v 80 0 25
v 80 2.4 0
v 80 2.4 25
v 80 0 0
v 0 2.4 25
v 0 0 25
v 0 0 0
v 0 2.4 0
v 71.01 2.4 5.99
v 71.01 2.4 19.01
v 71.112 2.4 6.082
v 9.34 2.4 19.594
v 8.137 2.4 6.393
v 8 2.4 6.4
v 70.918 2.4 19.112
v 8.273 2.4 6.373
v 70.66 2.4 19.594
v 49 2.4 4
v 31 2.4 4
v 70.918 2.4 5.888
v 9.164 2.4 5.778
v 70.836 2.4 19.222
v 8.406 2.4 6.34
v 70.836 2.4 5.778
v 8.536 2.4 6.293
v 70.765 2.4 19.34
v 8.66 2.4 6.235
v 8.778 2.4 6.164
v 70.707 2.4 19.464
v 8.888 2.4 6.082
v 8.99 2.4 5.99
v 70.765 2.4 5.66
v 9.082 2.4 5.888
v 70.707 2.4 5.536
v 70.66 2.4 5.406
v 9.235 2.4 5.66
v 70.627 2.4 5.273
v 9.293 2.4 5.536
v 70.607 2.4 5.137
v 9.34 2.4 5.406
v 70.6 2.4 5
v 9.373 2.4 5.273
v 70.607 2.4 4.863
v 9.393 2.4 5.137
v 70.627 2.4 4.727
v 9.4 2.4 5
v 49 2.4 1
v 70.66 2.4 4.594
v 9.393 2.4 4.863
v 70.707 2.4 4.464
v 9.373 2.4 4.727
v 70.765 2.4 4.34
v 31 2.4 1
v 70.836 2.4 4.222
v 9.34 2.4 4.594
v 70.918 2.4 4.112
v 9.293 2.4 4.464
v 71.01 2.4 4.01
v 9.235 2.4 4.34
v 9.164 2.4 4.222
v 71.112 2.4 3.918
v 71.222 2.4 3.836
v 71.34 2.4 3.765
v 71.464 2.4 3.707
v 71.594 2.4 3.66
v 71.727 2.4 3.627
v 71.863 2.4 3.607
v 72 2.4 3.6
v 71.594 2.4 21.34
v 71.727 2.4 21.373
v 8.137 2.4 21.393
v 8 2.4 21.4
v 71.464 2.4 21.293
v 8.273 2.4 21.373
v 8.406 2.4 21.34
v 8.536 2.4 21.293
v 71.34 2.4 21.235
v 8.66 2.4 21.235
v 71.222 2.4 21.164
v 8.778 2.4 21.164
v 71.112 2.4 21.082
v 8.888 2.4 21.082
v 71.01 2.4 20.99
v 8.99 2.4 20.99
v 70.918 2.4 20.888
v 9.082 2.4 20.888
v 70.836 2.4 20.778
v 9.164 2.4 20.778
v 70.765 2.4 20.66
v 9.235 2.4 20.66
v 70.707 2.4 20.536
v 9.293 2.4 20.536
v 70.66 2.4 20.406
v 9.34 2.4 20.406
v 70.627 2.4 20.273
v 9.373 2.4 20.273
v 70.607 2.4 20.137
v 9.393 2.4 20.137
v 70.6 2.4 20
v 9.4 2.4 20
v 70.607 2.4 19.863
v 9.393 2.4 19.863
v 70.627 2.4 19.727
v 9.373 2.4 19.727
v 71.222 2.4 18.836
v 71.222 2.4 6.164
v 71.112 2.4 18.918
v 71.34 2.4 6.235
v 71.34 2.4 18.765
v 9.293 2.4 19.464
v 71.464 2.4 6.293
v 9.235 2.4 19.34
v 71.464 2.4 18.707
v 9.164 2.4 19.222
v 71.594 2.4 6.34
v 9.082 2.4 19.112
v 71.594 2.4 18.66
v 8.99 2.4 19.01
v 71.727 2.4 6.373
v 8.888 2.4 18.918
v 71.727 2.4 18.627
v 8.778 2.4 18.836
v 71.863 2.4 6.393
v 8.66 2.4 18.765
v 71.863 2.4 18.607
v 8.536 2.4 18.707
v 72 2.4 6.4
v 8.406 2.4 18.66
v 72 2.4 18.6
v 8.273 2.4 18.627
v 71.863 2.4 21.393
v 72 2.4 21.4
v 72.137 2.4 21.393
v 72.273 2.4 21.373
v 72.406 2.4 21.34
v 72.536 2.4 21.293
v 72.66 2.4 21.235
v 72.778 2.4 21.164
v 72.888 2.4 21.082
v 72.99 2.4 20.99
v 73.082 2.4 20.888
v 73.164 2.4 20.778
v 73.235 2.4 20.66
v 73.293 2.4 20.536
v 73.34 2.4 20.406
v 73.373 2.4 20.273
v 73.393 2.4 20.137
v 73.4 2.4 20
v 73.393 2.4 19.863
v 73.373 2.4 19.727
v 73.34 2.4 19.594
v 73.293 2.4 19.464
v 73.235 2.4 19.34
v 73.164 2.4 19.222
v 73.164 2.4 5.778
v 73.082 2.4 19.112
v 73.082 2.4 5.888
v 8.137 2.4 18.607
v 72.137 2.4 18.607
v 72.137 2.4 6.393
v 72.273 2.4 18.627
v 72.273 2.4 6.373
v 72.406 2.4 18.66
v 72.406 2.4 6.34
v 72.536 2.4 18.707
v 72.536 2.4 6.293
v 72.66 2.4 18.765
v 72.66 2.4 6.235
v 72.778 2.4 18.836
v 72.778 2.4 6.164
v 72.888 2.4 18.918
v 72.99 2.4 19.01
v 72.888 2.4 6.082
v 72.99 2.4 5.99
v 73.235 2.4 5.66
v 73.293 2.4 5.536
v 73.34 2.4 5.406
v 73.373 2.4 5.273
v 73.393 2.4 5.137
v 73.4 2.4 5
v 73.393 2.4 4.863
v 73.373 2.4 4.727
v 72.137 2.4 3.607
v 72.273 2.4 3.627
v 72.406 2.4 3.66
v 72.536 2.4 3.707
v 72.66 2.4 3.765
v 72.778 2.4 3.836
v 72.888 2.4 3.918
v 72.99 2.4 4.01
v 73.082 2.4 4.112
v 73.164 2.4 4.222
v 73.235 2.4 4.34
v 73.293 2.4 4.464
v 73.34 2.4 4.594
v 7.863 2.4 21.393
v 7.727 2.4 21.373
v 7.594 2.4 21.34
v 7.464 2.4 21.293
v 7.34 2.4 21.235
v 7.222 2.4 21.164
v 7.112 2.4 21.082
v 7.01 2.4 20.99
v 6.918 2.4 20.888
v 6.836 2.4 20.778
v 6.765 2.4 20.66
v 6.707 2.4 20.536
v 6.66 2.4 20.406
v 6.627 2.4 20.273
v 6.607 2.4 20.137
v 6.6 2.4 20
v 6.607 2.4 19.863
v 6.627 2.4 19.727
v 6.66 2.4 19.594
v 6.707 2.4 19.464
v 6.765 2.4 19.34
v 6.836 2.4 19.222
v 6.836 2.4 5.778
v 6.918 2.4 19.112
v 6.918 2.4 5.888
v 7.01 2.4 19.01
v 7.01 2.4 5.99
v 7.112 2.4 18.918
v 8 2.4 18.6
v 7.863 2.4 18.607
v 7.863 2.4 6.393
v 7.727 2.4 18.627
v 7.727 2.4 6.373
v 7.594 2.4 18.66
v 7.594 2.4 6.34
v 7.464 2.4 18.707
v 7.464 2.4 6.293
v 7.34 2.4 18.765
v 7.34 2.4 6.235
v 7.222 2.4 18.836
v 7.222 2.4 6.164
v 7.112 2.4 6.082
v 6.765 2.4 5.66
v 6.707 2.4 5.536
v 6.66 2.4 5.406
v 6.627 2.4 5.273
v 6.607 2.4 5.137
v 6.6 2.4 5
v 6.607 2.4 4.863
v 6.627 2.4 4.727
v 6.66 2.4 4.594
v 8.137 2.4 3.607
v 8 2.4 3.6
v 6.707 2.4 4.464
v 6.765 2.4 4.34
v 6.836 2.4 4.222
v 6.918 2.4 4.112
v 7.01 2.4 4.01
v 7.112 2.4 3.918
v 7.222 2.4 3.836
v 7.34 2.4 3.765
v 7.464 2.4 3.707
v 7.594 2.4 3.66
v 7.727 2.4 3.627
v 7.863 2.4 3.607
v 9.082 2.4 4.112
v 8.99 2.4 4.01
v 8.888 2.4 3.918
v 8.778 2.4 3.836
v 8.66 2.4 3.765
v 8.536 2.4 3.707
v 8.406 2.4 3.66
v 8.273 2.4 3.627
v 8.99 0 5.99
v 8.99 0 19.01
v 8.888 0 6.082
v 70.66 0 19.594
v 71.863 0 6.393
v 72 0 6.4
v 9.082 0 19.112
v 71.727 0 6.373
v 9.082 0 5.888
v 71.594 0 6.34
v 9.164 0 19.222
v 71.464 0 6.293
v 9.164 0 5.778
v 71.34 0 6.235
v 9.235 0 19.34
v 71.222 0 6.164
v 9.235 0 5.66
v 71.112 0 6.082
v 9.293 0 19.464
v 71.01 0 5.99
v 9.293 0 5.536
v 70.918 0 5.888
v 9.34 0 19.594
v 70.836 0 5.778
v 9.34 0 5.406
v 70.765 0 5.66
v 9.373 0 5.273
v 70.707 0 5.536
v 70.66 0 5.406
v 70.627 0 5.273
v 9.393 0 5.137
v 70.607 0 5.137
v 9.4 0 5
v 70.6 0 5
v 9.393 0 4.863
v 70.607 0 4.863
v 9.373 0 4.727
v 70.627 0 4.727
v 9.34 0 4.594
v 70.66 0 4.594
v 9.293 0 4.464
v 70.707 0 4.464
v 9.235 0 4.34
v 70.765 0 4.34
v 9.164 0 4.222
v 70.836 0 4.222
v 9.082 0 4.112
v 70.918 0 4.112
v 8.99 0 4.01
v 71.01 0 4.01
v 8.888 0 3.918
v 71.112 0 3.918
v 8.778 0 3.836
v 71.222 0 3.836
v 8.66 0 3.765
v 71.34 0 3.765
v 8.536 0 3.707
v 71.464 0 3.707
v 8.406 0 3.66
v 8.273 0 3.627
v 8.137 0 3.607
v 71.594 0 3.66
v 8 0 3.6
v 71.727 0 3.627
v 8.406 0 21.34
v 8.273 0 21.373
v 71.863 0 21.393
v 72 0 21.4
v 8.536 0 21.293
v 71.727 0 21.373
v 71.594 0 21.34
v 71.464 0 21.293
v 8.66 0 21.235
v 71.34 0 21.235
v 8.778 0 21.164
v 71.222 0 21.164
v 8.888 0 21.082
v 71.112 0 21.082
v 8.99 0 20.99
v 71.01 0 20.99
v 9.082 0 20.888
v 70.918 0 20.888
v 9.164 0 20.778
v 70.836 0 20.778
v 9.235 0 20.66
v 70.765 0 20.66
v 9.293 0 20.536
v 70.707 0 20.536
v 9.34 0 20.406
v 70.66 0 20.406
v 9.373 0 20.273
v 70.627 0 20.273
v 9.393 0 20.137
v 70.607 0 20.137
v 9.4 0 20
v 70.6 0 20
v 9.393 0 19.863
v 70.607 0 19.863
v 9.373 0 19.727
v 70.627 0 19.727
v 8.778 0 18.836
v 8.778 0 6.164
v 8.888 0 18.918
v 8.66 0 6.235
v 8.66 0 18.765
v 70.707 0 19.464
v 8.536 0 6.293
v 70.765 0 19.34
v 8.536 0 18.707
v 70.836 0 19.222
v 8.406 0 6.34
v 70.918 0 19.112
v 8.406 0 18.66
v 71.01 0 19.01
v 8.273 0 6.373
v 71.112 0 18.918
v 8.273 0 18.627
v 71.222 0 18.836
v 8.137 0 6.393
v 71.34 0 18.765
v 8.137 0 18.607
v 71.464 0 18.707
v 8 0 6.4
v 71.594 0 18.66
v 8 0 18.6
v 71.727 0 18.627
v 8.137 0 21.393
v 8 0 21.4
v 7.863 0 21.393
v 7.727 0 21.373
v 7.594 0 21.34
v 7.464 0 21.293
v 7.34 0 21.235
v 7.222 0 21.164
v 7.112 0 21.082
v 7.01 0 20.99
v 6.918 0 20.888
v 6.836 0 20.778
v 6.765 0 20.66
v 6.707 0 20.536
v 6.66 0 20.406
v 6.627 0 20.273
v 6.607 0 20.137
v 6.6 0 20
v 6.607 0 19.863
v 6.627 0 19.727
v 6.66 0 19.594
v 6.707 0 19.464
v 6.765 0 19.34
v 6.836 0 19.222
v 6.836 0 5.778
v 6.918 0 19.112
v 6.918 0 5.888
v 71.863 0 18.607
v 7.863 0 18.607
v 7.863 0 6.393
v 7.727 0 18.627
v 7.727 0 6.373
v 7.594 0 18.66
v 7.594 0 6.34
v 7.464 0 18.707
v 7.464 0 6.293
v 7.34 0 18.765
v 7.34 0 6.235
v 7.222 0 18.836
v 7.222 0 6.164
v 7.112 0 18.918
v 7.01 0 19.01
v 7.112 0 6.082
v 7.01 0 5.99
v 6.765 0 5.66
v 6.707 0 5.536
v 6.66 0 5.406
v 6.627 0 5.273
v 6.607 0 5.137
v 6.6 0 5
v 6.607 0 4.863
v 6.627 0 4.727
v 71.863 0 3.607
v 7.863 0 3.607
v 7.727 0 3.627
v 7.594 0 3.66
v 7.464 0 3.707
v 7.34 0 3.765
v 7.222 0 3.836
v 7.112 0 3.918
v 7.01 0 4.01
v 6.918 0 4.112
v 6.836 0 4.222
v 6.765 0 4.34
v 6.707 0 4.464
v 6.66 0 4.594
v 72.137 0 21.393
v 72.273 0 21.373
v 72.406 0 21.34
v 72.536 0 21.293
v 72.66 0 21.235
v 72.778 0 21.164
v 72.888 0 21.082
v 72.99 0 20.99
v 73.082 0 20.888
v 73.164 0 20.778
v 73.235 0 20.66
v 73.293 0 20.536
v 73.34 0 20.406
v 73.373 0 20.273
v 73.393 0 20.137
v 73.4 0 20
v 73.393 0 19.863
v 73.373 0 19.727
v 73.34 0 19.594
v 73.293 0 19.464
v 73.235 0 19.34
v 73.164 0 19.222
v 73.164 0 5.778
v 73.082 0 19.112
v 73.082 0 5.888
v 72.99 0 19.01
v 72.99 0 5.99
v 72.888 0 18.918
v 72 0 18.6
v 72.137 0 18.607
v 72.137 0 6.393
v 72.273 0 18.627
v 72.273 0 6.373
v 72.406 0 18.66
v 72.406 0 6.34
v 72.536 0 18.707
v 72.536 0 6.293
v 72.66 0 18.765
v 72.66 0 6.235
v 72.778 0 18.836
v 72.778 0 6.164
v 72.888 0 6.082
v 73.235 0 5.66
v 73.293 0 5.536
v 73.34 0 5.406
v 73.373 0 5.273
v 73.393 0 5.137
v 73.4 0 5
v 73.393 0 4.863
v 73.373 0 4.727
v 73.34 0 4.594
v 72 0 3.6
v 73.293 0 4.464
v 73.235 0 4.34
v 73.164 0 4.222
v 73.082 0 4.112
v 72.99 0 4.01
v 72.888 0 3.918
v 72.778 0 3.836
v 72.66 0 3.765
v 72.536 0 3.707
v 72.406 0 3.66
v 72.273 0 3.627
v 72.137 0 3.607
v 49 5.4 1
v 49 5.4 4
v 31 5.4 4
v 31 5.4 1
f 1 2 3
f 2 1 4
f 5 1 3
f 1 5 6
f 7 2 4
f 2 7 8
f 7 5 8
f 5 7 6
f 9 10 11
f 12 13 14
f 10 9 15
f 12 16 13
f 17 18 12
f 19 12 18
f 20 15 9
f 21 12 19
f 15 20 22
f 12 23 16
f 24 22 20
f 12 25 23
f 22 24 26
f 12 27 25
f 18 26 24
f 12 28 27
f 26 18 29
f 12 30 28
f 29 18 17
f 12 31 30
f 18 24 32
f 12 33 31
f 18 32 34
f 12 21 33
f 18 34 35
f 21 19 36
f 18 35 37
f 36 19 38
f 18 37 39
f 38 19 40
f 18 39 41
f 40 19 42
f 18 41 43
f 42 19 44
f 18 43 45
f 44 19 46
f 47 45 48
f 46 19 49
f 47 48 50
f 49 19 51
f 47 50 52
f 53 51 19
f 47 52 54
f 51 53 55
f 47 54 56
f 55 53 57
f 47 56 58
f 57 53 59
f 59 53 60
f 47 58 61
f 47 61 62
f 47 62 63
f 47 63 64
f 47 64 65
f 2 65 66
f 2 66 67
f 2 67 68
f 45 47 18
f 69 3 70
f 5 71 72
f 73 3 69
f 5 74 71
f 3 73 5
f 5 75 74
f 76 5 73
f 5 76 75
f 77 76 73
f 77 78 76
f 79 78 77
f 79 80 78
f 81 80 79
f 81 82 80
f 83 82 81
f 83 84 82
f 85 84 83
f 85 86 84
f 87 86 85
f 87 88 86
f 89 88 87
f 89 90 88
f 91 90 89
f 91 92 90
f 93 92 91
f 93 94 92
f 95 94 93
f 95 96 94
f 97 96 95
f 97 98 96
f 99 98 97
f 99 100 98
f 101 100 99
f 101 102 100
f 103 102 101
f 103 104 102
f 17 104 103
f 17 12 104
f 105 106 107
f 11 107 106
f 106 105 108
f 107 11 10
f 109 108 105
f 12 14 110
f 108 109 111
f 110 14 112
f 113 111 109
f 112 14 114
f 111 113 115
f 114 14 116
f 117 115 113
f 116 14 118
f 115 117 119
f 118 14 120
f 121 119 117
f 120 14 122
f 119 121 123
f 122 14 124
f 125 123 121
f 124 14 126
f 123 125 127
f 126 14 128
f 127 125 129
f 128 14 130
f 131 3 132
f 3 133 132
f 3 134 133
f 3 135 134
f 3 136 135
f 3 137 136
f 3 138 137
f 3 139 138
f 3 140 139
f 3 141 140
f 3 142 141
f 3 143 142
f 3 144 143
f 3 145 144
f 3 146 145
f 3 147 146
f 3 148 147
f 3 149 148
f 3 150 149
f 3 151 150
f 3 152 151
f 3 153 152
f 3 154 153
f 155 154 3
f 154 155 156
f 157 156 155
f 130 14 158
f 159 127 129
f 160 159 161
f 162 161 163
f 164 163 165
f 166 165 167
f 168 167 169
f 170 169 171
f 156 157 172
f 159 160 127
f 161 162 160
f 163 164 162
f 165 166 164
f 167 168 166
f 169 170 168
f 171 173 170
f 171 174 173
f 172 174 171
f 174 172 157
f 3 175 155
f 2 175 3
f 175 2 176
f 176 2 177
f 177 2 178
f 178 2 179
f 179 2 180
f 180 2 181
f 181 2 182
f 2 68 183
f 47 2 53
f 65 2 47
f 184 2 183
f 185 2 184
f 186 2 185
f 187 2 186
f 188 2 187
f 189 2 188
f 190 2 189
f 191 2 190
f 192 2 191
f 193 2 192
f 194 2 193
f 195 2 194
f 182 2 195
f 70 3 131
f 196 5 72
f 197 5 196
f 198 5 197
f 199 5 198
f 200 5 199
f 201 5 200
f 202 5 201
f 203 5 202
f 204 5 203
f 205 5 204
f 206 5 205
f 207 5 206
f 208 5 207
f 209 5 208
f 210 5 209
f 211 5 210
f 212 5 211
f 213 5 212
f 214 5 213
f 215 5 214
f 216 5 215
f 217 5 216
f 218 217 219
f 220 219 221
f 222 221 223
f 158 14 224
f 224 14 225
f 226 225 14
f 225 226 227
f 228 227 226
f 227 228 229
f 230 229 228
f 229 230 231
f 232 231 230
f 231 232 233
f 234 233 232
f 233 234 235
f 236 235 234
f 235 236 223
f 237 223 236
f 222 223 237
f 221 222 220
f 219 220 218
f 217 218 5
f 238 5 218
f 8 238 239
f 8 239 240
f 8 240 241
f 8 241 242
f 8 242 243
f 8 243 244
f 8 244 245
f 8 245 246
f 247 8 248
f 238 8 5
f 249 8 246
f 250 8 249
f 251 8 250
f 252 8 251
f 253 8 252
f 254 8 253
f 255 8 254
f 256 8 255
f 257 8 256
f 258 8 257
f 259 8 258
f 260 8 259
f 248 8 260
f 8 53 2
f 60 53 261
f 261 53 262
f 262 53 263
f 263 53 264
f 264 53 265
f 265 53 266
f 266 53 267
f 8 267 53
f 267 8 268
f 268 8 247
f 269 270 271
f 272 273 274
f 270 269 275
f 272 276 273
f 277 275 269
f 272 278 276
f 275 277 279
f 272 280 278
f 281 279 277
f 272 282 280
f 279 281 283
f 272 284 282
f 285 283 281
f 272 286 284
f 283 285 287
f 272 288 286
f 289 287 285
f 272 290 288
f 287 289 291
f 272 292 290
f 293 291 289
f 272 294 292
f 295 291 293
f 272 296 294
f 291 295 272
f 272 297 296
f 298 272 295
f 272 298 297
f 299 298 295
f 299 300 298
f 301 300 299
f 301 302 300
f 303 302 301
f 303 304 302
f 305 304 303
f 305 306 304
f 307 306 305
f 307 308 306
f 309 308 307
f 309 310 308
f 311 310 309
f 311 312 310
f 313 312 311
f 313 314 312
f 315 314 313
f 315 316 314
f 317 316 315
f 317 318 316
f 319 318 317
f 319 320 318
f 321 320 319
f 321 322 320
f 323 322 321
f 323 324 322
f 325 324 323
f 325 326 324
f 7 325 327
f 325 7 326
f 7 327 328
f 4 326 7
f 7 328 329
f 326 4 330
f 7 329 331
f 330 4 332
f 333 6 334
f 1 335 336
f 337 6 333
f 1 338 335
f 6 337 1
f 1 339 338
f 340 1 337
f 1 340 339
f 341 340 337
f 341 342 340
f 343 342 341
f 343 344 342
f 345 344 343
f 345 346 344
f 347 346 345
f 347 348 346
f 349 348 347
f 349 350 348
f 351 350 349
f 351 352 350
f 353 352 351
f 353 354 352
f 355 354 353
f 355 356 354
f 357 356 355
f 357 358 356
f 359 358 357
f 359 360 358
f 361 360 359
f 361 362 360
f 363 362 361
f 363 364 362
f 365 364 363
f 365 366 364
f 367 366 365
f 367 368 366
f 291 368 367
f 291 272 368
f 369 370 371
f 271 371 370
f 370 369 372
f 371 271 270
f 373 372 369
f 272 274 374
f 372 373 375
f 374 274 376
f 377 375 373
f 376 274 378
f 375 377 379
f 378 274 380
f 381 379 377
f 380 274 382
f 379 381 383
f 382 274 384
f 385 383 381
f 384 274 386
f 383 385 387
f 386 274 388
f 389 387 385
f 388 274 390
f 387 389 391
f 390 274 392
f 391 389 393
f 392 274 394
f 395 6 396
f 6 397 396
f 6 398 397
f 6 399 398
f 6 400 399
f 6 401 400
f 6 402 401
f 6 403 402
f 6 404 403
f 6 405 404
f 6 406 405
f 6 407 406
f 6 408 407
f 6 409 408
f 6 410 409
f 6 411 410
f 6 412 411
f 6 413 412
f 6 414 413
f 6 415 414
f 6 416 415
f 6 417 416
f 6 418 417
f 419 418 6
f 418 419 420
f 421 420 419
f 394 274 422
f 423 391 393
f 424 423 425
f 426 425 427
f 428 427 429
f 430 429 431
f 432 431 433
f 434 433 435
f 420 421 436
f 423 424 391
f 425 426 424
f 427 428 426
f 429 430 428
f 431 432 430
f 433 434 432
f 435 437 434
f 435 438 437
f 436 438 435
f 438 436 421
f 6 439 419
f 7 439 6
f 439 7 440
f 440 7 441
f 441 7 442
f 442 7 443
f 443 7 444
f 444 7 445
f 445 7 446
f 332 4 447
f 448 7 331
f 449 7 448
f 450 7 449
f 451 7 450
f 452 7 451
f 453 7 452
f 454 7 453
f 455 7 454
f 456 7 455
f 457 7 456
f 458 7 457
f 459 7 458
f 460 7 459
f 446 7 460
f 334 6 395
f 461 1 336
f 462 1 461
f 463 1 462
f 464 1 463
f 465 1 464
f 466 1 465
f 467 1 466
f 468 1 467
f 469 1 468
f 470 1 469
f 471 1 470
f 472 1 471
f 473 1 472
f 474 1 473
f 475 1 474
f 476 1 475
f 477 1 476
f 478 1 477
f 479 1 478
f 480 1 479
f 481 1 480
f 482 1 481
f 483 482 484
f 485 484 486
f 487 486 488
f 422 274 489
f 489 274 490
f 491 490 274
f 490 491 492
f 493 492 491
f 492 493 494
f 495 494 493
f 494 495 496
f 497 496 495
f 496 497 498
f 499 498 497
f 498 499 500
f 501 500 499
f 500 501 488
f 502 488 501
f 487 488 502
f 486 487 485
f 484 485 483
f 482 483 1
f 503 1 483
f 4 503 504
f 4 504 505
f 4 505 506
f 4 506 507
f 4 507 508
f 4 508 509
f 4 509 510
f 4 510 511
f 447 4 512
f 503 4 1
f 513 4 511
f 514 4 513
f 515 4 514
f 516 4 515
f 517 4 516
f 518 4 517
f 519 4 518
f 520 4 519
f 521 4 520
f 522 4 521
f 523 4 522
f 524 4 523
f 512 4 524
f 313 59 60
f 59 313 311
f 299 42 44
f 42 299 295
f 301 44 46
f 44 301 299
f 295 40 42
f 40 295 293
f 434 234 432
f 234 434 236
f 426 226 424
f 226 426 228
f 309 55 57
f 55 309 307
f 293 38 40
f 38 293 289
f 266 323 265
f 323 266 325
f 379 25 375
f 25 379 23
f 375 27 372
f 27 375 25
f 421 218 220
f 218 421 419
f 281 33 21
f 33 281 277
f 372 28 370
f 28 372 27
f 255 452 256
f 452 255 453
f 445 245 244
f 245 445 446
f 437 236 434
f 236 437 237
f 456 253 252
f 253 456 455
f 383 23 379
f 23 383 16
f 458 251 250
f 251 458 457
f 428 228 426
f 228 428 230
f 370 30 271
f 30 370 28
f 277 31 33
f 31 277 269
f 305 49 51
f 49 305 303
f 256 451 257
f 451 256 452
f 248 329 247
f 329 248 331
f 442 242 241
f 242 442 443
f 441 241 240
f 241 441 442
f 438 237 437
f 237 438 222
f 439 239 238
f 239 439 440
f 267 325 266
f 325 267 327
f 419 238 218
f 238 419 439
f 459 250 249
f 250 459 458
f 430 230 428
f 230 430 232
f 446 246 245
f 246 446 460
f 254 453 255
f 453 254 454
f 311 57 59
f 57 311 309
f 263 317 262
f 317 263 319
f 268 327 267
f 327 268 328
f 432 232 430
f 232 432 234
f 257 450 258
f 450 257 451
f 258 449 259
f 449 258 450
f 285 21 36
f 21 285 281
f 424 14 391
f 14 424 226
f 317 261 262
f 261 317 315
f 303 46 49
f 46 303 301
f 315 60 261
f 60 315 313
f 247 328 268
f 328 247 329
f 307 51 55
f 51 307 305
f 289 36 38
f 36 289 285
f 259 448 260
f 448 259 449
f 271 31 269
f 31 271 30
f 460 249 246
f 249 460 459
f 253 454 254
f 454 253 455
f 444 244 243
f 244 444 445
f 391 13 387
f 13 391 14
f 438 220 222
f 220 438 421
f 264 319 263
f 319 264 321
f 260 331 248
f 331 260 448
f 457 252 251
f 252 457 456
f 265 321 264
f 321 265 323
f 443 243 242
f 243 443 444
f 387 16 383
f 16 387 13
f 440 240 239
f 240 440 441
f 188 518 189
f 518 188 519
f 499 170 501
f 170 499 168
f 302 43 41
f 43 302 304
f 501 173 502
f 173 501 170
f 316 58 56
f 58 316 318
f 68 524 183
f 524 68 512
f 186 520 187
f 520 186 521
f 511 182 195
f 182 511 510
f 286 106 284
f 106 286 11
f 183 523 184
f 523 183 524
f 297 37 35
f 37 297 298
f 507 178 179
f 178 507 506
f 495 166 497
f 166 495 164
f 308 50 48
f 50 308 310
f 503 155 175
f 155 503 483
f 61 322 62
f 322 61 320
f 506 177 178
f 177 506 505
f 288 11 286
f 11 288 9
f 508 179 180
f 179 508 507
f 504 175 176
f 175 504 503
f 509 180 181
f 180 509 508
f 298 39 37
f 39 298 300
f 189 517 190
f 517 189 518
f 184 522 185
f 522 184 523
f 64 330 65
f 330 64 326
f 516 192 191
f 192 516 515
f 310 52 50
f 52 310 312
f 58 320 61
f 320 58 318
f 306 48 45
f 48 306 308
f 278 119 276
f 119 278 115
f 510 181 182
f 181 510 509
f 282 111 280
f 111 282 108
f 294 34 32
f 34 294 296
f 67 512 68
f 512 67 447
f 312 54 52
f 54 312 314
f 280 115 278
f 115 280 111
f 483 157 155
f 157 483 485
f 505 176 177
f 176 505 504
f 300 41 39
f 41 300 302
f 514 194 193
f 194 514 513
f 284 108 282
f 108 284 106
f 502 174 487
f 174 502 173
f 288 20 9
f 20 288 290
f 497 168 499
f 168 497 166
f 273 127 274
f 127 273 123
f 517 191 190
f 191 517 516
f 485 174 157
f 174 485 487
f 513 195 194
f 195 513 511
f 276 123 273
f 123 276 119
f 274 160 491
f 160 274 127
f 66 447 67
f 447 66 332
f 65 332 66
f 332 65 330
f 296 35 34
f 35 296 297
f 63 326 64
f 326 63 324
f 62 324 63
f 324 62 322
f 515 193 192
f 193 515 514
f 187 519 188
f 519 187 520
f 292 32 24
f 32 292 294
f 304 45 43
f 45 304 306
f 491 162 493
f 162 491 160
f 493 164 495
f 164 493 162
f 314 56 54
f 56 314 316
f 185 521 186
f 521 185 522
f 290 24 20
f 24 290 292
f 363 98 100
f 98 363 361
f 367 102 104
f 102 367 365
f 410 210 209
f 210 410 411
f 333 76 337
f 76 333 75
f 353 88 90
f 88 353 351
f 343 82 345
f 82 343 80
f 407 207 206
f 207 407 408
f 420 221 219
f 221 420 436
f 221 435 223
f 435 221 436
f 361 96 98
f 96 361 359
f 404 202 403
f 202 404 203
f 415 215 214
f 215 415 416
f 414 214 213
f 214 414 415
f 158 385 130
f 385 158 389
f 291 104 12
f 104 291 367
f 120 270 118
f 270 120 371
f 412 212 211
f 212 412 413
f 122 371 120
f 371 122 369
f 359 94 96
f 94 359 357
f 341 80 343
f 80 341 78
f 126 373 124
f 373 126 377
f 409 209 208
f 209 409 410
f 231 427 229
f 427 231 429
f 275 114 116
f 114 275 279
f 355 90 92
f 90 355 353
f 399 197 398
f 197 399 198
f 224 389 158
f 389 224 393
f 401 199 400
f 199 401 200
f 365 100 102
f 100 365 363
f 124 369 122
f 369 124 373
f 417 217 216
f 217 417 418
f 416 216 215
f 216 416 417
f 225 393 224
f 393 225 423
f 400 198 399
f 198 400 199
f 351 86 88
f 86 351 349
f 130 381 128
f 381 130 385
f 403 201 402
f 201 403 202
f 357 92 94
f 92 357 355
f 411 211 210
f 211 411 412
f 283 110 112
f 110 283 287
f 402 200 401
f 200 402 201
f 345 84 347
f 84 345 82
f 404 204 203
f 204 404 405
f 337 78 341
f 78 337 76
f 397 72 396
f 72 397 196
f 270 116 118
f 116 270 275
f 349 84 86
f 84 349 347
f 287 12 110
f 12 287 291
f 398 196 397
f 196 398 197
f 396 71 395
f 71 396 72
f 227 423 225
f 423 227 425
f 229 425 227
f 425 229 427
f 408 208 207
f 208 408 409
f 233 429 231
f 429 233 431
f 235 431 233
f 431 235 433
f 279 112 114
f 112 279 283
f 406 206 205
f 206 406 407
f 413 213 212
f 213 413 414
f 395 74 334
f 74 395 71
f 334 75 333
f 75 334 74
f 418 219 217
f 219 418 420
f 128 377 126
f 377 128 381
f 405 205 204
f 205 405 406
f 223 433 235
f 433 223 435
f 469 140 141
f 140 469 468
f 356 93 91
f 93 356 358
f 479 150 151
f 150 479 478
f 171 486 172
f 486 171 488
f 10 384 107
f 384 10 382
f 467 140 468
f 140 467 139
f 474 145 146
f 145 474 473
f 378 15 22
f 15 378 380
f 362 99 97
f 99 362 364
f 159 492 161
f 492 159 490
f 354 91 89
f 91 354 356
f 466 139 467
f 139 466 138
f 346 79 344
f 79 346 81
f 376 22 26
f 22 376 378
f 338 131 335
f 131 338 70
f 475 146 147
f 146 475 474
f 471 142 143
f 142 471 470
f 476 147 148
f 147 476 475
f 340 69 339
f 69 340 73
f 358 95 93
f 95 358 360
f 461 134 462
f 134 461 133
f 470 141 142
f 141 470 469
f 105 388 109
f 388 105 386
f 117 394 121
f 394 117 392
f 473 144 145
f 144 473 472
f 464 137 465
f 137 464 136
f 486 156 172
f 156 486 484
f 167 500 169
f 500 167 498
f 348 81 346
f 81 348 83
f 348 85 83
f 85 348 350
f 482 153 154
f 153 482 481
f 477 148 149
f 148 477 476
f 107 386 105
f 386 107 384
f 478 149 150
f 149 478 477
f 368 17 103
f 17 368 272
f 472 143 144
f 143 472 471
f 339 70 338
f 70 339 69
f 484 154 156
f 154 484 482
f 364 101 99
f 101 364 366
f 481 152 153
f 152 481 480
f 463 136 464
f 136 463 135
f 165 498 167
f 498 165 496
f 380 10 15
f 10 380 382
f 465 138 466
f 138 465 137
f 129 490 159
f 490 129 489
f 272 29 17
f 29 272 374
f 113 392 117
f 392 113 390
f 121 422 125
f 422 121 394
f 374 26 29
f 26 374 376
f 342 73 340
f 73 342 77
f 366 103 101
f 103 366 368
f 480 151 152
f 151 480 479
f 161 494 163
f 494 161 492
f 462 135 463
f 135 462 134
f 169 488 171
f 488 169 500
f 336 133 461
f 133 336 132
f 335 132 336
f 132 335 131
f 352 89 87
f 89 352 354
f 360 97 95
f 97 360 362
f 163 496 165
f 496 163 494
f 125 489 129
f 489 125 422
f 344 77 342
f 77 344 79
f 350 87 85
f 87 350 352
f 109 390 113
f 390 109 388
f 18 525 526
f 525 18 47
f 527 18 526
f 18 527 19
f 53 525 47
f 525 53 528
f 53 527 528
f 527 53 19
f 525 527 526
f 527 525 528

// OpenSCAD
// StatusBeacon_LightCube_RearCover.scad
// Four M2 screws recommended.
// Units: mm

$fn = 64;

difference() {
    cube([80,2.4,25]);

    // screw holes
    translate([8,1.2,5]) rotate([90,0,0]) cylinder(h=4,d=2.8,center=true);
    translate([72,1.2,5]) rotate([90,0,0]) cylinder(h=4,d=2.8,center=true);
    translate([8,1.2,20]) rotate([90,0,0]) cylinder(h=4,d=2.8,center=true);
    translate([72,1.2,20]) rotate([90,0,0]) cylinder(h=4,d=2.8,center=true);
}

// pull lip
translate([31,2.4,1]) cube([18,3,3]);
